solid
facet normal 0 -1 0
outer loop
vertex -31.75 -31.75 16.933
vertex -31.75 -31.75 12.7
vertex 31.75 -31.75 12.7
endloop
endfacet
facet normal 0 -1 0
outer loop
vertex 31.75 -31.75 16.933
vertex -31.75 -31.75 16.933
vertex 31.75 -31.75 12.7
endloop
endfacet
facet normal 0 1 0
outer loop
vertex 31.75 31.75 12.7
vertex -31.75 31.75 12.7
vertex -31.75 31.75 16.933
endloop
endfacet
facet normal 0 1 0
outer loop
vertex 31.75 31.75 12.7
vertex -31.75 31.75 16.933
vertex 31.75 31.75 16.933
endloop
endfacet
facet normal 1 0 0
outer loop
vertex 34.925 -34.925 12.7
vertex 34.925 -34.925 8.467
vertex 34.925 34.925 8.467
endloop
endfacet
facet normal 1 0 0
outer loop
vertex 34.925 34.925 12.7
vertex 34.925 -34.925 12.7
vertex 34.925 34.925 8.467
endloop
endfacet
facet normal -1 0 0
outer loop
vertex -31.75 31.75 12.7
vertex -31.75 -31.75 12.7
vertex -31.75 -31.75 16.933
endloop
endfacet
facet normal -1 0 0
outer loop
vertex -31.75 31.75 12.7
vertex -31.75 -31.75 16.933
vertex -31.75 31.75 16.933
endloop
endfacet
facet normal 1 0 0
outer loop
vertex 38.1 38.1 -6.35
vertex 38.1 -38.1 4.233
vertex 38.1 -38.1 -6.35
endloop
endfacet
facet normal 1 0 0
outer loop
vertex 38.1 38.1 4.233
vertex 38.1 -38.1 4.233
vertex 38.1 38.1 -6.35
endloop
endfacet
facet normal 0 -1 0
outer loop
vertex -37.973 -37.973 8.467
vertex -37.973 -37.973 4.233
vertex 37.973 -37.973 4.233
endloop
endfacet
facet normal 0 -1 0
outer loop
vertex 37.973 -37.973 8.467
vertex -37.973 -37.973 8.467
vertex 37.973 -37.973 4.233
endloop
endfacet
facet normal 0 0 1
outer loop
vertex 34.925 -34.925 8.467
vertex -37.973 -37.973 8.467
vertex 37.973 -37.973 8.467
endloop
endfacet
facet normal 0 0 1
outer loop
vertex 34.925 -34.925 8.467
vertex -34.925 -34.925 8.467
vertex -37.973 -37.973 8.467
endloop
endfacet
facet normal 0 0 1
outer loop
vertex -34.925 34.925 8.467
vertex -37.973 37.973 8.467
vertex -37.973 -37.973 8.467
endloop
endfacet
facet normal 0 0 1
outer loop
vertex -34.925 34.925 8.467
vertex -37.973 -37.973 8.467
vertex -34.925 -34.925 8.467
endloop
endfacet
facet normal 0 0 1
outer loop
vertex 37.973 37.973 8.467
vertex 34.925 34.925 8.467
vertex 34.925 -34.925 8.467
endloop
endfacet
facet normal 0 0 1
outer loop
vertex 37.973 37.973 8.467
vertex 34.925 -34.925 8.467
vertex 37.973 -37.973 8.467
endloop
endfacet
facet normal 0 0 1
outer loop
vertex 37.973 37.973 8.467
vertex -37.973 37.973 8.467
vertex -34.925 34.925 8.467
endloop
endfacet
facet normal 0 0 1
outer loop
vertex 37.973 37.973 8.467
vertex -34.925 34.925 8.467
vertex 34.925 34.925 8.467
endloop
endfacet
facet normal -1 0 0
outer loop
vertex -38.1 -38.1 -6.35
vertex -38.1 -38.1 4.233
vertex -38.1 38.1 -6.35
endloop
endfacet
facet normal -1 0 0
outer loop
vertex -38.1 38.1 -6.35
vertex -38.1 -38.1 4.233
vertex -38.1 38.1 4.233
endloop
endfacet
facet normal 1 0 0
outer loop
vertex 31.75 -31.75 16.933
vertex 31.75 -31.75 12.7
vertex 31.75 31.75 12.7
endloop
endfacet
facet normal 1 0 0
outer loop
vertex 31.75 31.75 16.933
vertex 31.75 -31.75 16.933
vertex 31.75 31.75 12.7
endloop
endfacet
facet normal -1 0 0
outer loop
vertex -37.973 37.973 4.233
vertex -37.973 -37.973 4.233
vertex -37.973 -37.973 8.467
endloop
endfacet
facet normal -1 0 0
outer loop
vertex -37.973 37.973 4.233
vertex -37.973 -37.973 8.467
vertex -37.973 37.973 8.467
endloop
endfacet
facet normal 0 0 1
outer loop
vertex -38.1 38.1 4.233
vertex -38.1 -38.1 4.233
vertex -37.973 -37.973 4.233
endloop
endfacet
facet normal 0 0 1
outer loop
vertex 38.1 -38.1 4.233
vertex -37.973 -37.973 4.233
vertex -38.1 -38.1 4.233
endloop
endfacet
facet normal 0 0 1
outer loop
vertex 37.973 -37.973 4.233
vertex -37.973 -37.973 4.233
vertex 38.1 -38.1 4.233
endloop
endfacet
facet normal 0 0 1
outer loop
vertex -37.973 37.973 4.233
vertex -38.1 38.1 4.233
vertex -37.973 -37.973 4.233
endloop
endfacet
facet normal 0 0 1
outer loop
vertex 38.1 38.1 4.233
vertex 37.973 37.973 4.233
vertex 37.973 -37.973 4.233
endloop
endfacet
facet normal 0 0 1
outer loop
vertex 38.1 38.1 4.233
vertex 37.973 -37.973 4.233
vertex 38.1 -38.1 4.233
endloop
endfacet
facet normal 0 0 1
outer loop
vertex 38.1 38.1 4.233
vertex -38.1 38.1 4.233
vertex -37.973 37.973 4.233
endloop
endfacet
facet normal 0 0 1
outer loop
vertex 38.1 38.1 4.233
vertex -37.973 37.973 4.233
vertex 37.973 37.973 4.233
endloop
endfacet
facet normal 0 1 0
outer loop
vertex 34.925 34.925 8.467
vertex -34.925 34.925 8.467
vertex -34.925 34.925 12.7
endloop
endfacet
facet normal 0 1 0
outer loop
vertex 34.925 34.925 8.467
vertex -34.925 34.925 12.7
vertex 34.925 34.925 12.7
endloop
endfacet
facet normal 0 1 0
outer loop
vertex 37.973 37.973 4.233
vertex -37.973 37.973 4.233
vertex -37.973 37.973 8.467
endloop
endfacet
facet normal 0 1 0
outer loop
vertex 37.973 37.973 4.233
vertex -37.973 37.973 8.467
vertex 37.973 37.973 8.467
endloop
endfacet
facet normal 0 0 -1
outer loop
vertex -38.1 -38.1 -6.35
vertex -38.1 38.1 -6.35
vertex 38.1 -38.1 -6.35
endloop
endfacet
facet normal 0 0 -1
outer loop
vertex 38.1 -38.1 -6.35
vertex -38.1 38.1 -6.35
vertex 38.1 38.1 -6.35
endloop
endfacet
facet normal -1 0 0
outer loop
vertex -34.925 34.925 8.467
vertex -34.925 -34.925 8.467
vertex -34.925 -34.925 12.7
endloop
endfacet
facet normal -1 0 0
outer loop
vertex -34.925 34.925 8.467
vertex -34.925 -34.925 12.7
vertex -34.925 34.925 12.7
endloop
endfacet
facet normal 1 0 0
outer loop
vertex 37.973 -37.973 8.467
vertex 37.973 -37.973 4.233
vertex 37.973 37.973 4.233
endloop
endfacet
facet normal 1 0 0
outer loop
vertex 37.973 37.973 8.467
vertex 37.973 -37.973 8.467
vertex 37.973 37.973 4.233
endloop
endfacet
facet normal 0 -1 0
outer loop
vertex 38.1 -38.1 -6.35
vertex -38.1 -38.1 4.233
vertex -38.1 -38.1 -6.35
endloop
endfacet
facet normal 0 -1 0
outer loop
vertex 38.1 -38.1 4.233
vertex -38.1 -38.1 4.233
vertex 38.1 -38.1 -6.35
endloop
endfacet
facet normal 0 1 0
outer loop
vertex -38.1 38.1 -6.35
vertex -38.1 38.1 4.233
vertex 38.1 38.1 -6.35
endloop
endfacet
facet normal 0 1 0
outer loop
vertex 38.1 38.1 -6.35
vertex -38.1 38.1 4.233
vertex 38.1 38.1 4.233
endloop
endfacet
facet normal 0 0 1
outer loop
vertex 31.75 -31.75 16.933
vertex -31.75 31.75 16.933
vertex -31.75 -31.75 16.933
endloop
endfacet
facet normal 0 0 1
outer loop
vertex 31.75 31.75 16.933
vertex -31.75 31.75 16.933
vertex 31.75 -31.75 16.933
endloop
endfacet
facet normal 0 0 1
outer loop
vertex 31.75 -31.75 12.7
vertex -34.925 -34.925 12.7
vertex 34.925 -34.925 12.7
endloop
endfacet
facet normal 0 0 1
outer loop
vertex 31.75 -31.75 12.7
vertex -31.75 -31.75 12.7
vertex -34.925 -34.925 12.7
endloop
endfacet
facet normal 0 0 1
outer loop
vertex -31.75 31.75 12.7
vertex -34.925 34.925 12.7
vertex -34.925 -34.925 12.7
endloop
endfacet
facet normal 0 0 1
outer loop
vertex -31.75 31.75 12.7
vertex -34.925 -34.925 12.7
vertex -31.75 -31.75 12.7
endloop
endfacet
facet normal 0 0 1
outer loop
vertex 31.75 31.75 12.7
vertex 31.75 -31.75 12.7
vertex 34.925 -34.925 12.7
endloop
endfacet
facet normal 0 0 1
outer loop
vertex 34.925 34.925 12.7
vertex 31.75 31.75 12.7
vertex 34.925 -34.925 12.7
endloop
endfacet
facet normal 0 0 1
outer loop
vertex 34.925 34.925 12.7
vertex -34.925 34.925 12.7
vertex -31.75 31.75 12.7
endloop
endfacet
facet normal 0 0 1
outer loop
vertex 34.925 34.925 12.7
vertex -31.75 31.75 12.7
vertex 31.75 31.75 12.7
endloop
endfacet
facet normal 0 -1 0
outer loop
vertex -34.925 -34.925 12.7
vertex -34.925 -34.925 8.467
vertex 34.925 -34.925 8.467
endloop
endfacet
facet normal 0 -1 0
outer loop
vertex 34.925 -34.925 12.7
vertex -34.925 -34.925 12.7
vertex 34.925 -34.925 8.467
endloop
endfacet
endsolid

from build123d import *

# Parameters (mm, degrees)
F0_W     = 63.5
F0_H     = 63.5
F0_W_2   = 57.15
F0_H_2   = 57.15
F0_W_3   = 50.8
F0_H_3   = 50.8
F1_DEPTH = 16.9333333333
F0_W_4   = 69.85
F0_H_4   = 69.85
F2_DEPTH = 12.7
F0_W_5   = 75.946
F0_H_5   = 75.946
F3_DEPTH = 8.4666666667
F0_W_6   = 76.2
F0_H_6   = 76.2
F4_DEPTH = 4.2333333333
F5_DEPTH = 6.35


with BuildPart() as f1:
    # F0 (on Top) → F1 (new body)
    with BuildSketch(Plane.XY):
        Rectangle(F0_W, F0_H)
        Rectangle(F0_W_2, F0_H_2, mode=Mode.SUBTRACT)
        Rectangle(F0_W_2, F0_H_2)
        Rectangle(F0_W_3, F0_H_3, mode=Mode.SUBTRACT)
        Rectangle(F0_W_3, F0_H_3)
    extrude(amount=F1_DEPTH)

    # F0 (on Top) → F2 (join)
    with BuildSketch(Plane.XY):
        Rectangle(F0_W_4, F0_H_4)
        Rectangle(F0_W, F0_H, mode=Mode.SUBTRACT)
    extrude(amount=F2_DEPTH)

    # F0 (on Top) → F3 (join)
    with BuildSketch(Plane.XY):
        Rectangle(F0_W_5, F0_H_5)
        Rectangle(F0_W_4, F0_H_4, mode=Mode.SUBTRACT)
    extrude(amount=F3_DEPTH)

    # F0 (on Top) → F4 (join)
    with BuildSketch(Plane.XY):
        Rectangle(F0_W_6, F0_H_6)
        Rectangle(F0_W_5, F0_H_5, mode=Mode.SUBTRACT)
    extrude(amount=F4_DEPTH)

    # F5 (add): a face of the model
    f5_faces = [f1.faces().sort_by_distance(p)[0] for p in [
        (0, 0, 0),
    ]]
    extrude(f5_faces, amount=F5_DEPTH)


solid = f1.part
